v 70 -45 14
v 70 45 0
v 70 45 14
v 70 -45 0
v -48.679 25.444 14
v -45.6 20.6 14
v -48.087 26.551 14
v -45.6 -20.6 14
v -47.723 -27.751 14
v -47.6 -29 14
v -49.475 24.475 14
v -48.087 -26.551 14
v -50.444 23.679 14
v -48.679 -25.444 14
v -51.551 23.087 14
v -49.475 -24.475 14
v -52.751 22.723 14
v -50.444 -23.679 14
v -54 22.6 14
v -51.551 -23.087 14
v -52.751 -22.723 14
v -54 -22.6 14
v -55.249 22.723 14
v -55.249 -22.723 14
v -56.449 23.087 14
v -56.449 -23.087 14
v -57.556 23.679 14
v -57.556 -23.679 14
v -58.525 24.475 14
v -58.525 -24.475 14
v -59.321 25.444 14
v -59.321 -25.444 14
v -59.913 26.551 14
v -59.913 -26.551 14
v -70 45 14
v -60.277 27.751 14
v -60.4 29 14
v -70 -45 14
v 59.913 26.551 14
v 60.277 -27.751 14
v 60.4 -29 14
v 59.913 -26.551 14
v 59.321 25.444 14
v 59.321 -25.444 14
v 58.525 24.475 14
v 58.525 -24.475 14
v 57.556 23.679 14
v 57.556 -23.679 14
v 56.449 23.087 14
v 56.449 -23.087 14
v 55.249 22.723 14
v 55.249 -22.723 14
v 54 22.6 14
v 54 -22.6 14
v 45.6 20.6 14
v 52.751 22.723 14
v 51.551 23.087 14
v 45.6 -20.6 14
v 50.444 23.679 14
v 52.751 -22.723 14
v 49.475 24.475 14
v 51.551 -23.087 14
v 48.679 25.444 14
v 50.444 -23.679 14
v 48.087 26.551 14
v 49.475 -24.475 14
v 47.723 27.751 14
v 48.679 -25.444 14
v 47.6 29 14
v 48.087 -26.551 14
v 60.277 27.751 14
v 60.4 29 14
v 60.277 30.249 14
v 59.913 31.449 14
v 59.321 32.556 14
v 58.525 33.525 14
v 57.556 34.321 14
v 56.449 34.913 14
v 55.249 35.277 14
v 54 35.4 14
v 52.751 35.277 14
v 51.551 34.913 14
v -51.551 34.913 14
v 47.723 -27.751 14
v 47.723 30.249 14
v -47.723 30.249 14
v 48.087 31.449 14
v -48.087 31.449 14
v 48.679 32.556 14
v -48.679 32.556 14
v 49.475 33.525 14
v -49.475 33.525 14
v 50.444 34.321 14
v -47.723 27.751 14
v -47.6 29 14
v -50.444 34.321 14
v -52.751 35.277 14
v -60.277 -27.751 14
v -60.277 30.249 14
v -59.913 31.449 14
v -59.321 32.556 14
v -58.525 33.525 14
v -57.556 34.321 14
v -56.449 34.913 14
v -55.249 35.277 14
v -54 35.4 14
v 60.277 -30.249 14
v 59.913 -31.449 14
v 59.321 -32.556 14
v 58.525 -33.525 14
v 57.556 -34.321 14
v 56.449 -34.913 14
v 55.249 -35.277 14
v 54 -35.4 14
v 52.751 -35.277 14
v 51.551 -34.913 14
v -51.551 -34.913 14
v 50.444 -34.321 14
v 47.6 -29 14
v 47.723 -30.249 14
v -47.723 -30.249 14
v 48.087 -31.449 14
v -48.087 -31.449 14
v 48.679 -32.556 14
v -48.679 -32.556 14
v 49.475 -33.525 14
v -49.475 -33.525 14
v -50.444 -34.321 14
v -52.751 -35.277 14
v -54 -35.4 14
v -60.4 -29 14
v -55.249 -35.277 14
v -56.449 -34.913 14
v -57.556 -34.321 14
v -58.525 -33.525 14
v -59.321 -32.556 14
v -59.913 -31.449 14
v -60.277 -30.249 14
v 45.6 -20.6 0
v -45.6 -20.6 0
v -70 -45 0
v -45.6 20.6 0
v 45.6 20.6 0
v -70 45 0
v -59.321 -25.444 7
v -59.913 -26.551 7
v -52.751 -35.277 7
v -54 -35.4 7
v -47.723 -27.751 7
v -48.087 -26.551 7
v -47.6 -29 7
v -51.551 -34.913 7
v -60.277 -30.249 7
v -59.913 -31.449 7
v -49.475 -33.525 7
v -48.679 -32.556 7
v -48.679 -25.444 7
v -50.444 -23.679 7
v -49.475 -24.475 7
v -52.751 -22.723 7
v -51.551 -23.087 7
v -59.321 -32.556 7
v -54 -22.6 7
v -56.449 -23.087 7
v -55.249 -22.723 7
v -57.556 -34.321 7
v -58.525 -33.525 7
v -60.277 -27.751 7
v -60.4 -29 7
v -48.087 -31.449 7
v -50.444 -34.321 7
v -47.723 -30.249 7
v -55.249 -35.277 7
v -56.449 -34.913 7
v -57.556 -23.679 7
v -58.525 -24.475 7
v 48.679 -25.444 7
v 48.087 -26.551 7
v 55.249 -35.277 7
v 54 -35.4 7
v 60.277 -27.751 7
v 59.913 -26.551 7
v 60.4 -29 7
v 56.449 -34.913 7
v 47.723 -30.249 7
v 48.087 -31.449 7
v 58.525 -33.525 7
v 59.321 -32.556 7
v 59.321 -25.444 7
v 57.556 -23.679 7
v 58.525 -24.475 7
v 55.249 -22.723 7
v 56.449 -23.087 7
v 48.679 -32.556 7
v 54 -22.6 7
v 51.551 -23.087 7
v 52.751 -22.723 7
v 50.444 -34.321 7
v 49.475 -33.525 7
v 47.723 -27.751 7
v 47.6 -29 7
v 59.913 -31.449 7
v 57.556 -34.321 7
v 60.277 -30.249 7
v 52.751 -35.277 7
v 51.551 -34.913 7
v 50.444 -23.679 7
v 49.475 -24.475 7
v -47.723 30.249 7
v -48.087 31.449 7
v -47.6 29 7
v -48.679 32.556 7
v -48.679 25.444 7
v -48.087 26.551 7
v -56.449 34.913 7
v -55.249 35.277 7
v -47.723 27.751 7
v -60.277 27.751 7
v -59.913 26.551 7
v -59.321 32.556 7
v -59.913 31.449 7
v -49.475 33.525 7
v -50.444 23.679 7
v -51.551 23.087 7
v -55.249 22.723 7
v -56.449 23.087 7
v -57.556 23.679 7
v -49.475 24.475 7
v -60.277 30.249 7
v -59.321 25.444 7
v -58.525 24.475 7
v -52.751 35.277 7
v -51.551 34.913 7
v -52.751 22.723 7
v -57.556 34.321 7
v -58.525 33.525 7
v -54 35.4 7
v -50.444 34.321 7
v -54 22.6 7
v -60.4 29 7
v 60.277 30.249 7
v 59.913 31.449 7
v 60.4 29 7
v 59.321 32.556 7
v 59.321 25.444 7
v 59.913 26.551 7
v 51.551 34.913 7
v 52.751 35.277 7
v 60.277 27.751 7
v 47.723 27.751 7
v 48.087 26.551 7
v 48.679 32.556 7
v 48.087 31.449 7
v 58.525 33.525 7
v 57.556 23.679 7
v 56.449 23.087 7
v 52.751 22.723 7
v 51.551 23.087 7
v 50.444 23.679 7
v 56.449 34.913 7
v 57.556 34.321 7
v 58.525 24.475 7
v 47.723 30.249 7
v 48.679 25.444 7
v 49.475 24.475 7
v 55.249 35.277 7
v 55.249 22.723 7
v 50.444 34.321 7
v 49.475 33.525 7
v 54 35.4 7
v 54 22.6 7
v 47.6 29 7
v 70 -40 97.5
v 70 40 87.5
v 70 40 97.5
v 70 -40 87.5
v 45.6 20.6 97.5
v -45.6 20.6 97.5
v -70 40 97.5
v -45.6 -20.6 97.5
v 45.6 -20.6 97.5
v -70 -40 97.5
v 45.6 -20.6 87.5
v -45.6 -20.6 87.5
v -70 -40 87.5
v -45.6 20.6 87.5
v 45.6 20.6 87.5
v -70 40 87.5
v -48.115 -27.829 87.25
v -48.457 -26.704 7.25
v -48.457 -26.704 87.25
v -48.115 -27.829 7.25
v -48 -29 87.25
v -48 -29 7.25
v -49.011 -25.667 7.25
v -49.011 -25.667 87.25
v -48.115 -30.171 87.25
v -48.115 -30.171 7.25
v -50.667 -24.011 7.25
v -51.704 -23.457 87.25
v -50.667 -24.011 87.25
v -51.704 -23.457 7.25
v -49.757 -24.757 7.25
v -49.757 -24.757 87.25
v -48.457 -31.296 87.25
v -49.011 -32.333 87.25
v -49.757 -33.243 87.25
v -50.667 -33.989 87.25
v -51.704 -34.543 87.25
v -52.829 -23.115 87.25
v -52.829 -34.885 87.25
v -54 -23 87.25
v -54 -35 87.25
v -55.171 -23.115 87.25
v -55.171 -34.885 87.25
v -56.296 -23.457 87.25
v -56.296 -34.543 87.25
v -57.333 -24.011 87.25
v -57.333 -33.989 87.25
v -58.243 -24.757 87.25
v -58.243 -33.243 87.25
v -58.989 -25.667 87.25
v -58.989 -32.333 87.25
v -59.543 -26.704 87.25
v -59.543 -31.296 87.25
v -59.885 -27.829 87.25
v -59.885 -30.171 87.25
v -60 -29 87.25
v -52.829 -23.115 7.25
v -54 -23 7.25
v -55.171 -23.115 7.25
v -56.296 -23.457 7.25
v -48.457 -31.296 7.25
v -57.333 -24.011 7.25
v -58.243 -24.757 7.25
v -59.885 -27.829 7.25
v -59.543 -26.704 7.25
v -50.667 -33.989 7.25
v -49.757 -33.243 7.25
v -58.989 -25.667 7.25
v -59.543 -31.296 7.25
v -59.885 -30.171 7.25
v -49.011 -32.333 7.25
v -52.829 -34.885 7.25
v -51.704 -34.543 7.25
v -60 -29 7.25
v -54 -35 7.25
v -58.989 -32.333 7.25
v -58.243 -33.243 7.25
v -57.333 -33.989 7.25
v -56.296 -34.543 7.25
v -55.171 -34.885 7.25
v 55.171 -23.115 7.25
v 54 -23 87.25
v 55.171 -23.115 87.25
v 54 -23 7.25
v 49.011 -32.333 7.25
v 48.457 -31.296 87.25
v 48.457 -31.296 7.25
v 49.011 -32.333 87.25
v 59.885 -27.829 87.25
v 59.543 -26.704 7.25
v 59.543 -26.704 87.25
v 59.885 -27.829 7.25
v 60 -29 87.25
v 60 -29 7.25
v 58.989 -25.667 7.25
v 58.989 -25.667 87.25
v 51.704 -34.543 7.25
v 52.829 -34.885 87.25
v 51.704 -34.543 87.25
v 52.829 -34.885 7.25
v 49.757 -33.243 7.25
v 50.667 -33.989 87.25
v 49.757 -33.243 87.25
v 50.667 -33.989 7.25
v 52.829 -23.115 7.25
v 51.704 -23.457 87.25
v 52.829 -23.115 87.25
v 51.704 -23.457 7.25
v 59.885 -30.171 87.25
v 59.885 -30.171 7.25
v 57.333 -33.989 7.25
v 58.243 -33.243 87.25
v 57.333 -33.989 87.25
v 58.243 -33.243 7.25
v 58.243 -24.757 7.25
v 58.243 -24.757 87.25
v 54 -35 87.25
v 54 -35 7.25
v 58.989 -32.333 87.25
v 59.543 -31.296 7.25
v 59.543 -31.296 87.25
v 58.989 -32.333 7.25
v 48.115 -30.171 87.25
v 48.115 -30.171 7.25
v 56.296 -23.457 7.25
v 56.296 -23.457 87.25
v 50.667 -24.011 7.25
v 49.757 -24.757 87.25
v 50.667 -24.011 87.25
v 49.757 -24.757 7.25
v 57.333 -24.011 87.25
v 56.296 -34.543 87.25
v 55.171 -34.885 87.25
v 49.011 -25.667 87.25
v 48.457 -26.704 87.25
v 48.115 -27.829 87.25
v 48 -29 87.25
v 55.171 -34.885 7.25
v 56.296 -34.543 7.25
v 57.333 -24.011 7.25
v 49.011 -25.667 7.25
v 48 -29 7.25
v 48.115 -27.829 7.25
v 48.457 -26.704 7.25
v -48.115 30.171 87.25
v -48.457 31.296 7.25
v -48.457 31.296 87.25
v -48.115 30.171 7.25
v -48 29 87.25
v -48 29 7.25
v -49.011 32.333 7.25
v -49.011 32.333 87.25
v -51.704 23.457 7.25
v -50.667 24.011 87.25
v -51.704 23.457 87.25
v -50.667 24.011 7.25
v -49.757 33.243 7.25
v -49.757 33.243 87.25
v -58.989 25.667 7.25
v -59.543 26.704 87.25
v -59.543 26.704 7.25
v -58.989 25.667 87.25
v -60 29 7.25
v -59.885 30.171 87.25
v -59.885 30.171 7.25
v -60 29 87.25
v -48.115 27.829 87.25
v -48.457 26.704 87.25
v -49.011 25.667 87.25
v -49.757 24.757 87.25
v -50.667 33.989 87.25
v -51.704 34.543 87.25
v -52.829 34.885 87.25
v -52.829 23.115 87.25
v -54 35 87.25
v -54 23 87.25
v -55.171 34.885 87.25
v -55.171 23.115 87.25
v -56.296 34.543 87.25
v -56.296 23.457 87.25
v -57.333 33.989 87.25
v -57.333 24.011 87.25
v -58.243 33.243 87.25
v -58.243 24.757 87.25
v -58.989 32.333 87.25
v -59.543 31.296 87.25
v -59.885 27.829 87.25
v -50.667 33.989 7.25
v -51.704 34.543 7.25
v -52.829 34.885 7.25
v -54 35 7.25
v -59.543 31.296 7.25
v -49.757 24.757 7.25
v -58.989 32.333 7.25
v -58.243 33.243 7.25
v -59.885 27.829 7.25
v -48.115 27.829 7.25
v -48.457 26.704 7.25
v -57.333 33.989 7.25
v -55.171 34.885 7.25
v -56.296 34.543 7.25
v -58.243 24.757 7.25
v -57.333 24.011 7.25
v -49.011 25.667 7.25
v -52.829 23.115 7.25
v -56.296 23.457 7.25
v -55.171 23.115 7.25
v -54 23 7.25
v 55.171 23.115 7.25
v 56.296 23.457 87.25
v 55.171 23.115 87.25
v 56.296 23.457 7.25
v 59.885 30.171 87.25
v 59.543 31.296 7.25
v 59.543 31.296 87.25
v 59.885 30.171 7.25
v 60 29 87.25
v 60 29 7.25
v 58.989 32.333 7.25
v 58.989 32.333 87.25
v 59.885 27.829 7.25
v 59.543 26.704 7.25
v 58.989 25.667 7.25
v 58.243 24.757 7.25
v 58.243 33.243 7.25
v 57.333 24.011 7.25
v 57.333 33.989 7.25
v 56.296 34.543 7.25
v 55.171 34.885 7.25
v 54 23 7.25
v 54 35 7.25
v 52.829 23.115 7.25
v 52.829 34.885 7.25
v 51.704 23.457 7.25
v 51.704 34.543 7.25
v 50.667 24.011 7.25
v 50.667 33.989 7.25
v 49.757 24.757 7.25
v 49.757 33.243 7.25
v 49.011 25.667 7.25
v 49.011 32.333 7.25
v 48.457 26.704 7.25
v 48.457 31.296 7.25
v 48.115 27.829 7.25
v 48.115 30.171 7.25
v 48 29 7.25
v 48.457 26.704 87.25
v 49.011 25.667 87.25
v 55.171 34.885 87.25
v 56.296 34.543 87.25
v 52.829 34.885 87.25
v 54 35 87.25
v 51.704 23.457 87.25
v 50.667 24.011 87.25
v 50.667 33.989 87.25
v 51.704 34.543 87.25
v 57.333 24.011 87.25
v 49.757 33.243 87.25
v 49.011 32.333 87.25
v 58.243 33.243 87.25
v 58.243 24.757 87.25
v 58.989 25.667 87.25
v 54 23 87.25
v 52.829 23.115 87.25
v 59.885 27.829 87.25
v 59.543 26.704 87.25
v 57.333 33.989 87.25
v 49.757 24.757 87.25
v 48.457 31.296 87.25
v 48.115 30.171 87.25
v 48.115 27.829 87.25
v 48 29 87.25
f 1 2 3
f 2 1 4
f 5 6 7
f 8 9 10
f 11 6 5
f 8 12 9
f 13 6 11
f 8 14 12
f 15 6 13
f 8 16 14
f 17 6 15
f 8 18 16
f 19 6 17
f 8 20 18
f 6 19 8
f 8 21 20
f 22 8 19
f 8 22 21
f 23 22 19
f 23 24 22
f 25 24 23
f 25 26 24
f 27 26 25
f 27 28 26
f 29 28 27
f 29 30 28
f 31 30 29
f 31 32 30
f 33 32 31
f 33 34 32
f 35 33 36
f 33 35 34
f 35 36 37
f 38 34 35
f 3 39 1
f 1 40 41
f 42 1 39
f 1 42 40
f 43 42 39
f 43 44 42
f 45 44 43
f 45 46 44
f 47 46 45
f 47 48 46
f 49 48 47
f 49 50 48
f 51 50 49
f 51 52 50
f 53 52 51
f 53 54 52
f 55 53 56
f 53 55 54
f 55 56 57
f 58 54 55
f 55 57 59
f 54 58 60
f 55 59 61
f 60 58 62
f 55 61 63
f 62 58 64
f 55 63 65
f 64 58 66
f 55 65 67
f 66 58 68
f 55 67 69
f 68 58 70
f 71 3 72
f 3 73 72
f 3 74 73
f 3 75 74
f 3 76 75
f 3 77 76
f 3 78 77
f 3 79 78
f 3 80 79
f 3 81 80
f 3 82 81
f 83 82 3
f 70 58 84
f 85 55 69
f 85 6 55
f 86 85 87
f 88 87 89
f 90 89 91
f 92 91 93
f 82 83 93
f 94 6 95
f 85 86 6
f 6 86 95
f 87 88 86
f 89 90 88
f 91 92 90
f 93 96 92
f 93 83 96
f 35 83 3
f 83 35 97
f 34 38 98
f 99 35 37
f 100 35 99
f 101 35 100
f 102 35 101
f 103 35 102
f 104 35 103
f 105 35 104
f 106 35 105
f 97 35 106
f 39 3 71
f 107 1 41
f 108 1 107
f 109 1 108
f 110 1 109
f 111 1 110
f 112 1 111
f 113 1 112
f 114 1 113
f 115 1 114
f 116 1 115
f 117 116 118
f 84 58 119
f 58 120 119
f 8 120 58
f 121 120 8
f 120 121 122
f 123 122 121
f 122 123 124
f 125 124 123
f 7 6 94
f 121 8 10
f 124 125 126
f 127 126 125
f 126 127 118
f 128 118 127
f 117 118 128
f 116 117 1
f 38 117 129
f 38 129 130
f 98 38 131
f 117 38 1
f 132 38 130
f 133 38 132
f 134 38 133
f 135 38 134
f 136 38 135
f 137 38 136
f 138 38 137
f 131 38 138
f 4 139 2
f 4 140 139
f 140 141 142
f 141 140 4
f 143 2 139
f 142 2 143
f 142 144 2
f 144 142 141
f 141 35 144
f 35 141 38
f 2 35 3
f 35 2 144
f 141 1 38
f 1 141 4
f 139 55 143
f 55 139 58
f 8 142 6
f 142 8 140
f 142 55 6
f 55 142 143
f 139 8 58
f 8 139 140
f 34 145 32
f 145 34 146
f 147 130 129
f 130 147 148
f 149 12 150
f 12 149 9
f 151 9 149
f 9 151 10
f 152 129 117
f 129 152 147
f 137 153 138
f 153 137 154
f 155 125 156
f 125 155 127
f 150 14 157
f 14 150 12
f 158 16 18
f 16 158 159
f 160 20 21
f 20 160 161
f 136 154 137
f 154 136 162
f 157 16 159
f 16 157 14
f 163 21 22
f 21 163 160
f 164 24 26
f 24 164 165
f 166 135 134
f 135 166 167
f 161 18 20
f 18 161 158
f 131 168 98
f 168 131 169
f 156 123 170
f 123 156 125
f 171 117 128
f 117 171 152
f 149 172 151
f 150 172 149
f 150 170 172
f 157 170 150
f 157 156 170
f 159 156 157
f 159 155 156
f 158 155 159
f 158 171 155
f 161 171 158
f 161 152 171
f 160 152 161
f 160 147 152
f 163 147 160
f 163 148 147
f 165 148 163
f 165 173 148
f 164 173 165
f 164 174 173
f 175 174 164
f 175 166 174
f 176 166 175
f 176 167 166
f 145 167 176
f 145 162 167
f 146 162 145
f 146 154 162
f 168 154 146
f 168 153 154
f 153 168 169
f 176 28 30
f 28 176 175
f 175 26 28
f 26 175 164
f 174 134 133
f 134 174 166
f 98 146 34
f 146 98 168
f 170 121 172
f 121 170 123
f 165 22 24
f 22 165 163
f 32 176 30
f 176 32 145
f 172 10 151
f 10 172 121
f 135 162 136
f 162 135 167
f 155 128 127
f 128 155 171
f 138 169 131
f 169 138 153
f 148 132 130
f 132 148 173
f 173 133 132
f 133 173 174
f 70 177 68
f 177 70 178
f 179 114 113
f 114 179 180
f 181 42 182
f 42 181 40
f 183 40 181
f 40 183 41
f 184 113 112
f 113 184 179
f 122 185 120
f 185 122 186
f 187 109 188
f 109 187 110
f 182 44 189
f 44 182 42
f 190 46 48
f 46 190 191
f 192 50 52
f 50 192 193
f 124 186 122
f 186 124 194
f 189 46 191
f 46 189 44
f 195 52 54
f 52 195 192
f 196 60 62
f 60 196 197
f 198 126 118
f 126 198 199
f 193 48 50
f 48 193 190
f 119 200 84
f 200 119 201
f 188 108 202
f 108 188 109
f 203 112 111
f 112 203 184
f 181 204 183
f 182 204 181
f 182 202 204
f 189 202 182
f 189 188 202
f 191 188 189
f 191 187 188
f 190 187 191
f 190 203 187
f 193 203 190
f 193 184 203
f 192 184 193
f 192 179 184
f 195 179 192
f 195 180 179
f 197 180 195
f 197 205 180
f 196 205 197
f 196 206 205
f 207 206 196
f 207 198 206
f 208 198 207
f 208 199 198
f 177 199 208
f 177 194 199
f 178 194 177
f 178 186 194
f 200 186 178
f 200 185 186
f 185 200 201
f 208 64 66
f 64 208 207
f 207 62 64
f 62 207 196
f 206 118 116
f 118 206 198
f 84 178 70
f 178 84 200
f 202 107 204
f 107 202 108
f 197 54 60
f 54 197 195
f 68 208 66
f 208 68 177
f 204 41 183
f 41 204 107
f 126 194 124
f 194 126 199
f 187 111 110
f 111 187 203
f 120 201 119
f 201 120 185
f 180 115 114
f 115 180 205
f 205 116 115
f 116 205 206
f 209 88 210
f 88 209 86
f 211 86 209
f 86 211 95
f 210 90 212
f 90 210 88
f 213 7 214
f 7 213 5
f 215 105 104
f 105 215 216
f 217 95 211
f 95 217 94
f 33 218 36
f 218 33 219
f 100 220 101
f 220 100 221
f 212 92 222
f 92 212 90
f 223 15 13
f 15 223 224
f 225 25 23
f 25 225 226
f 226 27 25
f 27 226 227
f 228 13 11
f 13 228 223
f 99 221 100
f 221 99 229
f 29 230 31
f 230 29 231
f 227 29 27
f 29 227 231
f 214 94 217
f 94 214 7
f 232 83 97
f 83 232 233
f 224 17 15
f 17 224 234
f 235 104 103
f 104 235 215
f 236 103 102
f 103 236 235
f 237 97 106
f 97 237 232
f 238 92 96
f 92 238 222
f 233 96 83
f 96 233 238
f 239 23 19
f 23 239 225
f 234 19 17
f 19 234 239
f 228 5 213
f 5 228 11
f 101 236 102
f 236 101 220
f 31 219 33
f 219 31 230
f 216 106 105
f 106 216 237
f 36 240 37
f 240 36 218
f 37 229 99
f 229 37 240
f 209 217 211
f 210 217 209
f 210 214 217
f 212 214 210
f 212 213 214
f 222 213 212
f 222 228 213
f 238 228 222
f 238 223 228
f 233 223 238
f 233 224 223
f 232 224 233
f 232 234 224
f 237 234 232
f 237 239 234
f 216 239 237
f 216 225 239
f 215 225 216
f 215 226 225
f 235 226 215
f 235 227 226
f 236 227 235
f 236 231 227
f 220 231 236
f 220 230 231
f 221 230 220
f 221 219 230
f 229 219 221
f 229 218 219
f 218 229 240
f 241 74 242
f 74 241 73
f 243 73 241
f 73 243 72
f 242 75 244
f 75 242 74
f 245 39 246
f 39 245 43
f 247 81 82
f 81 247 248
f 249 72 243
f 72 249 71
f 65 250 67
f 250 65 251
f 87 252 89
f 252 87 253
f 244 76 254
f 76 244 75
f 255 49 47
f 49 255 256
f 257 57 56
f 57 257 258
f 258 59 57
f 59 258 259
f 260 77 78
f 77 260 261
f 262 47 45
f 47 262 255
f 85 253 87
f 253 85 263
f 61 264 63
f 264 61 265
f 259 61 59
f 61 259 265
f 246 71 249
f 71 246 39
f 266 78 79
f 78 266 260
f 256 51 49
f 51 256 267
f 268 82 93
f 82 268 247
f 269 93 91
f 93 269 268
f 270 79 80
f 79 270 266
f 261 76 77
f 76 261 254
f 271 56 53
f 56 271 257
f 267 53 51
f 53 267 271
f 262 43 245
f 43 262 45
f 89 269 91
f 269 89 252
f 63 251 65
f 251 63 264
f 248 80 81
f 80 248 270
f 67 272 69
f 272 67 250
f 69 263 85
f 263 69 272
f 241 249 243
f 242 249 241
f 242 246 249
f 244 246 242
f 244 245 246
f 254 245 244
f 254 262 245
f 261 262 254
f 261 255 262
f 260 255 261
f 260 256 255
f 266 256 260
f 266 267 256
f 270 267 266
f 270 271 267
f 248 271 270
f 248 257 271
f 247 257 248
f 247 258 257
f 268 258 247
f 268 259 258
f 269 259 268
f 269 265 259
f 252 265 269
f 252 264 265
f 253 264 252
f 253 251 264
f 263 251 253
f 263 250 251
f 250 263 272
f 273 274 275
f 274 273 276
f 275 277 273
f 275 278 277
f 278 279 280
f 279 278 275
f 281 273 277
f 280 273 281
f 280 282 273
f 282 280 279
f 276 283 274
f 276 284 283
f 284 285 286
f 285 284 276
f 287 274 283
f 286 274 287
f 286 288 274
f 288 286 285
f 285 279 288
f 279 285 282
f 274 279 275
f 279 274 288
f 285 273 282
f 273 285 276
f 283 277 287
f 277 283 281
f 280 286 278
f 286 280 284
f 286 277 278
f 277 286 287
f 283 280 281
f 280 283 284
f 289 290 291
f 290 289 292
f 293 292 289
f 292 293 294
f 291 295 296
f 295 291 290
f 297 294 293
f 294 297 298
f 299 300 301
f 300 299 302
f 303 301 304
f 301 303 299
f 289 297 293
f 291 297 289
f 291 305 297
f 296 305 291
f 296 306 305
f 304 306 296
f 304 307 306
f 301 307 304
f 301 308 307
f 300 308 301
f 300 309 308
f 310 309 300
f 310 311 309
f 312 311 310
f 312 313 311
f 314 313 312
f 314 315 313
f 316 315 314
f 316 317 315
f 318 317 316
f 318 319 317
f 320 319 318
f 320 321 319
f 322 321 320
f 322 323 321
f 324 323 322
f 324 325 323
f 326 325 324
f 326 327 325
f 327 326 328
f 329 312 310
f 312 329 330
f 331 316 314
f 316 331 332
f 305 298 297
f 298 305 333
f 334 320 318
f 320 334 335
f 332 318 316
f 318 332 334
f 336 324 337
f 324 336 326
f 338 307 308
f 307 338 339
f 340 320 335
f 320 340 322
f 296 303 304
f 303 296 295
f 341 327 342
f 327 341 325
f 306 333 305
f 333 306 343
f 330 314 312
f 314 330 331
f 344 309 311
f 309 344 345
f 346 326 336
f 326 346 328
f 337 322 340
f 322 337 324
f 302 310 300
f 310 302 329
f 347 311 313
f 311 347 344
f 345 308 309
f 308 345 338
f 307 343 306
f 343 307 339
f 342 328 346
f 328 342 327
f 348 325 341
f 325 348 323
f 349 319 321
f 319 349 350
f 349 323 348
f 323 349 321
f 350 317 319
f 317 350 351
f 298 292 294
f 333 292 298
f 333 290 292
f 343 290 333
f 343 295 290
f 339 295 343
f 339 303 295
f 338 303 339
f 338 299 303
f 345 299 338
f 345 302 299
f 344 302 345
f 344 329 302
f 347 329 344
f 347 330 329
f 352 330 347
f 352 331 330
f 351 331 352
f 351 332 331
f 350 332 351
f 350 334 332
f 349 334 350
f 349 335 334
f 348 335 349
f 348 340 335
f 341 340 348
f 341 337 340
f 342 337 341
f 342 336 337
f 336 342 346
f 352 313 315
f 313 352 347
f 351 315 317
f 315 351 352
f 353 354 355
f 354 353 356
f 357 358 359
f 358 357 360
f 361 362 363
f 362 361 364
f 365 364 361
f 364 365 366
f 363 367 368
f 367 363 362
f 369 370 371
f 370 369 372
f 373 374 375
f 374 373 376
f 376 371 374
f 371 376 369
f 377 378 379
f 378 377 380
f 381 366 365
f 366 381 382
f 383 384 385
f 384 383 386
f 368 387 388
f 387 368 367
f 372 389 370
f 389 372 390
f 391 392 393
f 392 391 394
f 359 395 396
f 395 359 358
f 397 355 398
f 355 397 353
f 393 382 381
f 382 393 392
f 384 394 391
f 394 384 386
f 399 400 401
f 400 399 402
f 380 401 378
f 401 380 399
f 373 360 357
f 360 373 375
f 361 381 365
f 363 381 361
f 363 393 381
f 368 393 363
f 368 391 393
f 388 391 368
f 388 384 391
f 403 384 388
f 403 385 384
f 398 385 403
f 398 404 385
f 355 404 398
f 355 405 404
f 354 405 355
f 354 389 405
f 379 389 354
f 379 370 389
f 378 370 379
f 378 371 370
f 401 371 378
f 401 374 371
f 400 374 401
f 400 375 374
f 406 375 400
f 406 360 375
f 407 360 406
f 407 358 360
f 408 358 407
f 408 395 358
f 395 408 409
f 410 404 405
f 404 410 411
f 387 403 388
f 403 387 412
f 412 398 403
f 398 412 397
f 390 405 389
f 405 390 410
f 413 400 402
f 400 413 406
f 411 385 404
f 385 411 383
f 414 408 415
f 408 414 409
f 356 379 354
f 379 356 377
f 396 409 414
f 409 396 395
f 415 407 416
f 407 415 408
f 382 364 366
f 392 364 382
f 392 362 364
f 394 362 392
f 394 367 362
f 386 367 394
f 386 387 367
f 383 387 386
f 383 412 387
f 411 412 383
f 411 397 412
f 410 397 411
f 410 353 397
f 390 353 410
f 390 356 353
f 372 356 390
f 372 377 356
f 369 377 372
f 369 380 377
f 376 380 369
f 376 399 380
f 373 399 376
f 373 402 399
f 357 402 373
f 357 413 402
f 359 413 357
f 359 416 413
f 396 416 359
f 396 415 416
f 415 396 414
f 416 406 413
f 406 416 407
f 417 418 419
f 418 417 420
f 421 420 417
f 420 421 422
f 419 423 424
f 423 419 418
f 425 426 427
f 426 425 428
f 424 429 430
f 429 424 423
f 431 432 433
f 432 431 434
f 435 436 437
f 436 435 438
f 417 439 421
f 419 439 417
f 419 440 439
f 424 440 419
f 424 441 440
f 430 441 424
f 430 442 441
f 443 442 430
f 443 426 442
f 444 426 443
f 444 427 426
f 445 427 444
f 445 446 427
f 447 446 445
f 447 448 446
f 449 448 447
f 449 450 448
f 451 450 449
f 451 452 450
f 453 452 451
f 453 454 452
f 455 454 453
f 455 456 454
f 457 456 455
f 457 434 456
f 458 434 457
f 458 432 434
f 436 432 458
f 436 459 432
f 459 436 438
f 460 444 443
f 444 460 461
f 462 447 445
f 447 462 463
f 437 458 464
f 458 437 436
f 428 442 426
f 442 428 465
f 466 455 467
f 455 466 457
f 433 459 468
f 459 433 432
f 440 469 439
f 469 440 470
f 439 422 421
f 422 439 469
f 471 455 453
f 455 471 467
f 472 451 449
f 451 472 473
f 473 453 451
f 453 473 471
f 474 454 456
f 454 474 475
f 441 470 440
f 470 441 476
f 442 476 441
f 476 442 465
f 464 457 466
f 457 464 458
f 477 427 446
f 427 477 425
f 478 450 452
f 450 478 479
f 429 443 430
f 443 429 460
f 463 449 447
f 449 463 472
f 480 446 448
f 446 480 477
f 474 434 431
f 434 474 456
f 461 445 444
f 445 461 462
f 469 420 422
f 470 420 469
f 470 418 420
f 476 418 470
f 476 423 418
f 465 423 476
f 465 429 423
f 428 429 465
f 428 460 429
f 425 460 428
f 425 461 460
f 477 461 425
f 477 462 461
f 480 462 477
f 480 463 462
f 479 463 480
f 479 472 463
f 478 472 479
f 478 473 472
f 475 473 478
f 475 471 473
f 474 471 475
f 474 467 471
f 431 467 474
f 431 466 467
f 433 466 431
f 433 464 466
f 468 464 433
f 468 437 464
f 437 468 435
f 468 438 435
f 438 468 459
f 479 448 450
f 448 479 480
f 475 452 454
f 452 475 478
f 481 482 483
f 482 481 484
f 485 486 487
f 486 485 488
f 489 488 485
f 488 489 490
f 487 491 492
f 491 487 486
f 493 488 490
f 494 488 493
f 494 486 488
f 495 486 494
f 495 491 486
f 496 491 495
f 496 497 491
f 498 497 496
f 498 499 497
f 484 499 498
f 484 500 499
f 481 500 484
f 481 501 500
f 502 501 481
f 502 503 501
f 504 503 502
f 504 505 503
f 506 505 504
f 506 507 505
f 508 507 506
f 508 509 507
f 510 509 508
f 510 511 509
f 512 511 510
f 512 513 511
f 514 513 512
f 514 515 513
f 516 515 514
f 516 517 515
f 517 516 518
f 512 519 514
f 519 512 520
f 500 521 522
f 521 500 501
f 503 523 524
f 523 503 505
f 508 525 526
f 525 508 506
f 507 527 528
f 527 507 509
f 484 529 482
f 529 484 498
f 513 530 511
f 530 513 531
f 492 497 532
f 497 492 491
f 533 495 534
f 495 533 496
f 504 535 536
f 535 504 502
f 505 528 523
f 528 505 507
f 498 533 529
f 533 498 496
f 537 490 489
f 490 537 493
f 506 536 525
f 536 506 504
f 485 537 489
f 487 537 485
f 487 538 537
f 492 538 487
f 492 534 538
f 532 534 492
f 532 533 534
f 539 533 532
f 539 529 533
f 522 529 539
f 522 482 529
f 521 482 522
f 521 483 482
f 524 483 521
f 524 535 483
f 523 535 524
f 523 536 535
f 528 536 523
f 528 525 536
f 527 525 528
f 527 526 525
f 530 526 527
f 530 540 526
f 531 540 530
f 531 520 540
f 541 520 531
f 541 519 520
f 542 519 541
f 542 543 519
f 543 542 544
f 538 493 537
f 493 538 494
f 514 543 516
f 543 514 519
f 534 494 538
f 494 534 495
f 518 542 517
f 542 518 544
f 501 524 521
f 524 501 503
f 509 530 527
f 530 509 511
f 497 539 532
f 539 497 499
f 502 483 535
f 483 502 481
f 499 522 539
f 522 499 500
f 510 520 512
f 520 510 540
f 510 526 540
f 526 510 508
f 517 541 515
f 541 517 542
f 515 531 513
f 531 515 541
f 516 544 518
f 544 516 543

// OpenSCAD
$fn = 32;

// ------------------------------------------------------------------------
// Frame cube: base 140 x 90 mm, posts 80 mm tall
// Every part is its own module, assembly() places every instance.
// ------------------------------------------------------------------------

// --- part 1 ---
module base_frame() {
  difference() {
    translate([-70, -45, 0]) cube([140, 90, 14]);
    translate([-45.6, -20.6, -1]) cube([91.2, 41.2, 16]);
    translate([-54, -29, 7]) cylinder(h = 8, d = 12.8);
    translate([54, -29, 7]) cylinder(h = 8, d = 12.8);
    translate([-54, 29, 7]) cylinder(h = 8, d = 12.8);
    translate([54, 29, 7]) cylinder(h = 8, d = 12.8);
  }
}

// --- part 2 ---
module corner_post() {
  cylinder(h = 80, d = 12);
}

// --- part 3 ---
module top_frame() {
  difference() {
    translate([-70, -40, 0]) cube([140, 80, 10]);
    translate([-45.6, -20.6, -1]) cube([91.2, 41.2, 12]);
  }
}

// --- assembly ---
module assembly() {
  color([0.80, 0.24, 0.20]) translate([0, 0, 0]) rotate([0, 0, 0]) base_frame();
  color([0.20, 0.45, 0.75]) translate([-54, -29, 7.25]) rotate([0, 0, 0]) corner_post();
  color([0.25, 0.62, 0.32]) translate([54, -29, 7.25]) rotate([0, 0, 0]) corner_post();
  color([0.92, 0.70, 0.18]) translate([-54, 29, 7.25]) rotate([0, 0, 0]) corner_post();
  color([0.58, 0.35, 0.70]) translate([54, 29, 7.25]) rotate([0, 0, 0]) corner_post();
  color([0.16, 0.66, 0.66]) translate([0, 0, 87.5]) rotate([0, 0, 0]) top_frame();
}

assembly();
